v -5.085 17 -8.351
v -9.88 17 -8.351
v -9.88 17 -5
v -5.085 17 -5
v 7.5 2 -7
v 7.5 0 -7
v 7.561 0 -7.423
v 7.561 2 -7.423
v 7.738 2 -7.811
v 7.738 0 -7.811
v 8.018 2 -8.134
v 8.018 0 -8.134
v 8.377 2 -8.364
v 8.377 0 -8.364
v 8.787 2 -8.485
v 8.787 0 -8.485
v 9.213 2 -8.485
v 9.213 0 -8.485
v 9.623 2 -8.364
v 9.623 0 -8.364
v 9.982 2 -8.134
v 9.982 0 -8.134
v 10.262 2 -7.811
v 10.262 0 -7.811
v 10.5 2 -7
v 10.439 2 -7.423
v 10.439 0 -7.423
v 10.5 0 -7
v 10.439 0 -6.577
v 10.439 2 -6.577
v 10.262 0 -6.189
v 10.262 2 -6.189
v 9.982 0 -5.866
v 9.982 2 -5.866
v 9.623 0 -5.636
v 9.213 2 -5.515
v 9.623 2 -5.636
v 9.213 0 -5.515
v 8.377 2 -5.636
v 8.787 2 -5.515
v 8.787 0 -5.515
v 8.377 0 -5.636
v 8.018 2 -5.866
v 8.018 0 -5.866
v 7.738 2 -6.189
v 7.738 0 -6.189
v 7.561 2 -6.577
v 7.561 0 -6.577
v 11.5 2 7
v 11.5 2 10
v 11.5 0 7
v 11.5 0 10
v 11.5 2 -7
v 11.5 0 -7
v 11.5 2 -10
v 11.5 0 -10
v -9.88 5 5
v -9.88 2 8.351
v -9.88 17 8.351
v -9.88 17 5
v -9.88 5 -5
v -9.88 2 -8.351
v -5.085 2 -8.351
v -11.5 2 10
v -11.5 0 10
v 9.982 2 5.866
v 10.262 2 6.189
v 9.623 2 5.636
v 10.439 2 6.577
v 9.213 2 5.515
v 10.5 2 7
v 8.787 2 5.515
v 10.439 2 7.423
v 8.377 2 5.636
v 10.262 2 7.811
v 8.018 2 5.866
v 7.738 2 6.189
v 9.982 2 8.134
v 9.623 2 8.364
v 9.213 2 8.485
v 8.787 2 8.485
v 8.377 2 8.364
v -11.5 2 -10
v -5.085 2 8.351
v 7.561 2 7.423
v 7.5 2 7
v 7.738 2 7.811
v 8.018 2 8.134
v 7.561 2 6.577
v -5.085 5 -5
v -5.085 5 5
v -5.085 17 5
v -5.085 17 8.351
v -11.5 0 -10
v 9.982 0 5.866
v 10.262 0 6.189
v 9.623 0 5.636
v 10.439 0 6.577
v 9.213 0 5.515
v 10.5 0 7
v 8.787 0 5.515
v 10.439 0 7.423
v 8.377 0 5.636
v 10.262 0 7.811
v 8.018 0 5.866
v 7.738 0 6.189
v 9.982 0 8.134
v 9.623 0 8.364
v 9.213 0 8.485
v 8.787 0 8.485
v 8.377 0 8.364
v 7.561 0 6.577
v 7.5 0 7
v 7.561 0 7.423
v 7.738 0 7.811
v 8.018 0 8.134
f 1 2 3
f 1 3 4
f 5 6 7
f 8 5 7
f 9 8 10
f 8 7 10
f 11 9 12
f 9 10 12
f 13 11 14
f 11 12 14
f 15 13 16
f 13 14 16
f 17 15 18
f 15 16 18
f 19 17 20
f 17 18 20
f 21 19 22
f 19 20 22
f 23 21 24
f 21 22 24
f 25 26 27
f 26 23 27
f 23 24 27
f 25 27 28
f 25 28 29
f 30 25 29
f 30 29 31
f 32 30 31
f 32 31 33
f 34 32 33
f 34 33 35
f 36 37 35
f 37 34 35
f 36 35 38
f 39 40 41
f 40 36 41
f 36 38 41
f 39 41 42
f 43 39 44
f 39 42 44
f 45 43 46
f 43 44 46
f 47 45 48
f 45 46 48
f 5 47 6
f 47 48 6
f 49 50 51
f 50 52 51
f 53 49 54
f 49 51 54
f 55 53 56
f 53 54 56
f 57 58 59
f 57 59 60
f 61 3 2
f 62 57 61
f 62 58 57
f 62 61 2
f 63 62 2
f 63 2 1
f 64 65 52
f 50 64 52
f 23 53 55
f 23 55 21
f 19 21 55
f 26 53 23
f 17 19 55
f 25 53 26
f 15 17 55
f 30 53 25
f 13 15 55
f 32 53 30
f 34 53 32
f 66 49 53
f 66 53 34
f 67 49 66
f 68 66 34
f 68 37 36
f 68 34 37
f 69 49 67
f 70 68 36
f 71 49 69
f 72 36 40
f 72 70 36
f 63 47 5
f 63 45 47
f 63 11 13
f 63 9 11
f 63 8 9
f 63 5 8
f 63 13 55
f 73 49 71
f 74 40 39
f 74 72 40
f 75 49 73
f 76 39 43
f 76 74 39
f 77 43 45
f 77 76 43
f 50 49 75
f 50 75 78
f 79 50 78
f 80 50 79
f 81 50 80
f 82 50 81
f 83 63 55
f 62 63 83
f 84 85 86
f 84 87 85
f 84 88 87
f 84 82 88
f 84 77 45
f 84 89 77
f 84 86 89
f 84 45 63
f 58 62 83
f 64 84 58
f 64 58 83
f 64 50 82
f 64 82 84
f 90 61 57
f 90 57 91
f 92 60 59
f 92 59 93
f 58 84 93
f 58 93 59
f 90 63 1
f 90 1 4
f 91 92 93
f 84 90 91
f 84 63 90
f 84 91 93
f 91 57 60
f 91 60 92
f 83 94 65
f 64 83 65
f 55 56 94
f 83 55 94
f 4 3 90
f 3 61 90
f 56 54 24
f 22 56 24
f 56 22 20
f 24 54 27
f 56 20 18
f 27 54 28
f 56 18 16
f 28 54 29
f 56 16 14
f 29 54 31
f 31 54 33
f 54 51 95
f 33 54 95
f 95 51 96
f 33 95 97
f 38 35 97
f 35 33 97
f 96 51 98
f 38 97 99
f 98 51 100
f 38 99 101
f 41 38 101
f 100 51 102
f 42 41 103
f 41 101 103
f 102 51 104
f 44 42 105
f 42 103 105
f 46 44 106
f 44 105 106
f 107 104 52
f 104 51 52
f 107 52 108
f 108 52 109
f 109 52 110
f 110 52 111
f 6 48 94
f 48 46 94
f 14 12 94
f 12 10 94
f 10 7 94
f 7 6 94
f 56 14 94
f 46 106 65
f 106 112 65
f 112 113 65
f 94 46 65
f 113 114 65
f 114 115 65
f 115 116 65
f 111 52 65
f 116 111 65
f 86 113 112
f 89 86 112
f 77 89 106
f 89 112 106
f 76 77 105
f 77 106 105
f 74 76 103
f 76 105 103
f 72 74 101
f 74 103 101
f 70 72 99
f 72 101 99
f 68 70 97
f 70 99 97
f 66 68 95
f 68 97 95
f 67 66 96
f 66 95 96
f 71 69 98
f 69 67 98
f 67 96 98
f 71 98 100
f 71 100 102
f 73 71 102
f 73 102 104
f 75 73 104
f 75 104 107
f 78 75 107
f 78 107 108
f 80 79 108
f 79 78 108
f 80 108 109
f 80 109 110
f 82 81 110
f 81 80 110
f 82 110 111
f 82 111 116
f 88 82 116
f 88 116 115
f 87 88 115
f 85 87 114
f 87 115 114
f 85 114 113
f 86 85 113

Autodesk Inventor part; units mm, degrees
ref_plane "YZ Plane" through (0, 0, 0) normal (1, 0, 0) x (0, 1, 0)
ref_plane "XZ Plane" through (0, 0, 0) normal (0, 1, 0) x (-1, 0, 0)
ref_plane "XY Plane" through (0, 0, 0) normal (0, 0, 1) x (1, 0, 0)
sketch "Sketch1" plane through (0, 0, 0) normal (0, 1, 0) x (-1, 0, 0)
  line L0 (11.5, 10) -> (-11.5, 10)
  line L1 (-11.5, 10) -> (-11.5, -10)
  line L2 (-11.5, -10) -> (11.5, -10)
  line L3 (11.5, -10) -> (11.5, 10)
  line L4 (11.5, 10) -> (-11.5, -10) construction
  line L5 (-11.5, 10) -> (11.5, -10) construction
  line L6 (-11.5, 0) -> (-11.5, -7)
  line L7 (-11.5, 0) -> (-11.5, 7)
  line L8 (-11.5, 7) -> (-9, 7)
  circle A0 centre (-9, 7) radius 1.5
  line L9 (-11.5, -7) -> (-9, -7)
  circle A1 centre (-9, -7) radius 1.5
  point P0 (0, 0)
  dimension "d0" = 23
  dimension "d1" = 20
  dimension "d2" = 7
  dimension "d3" = 7
  dimension "d4" = 2.5
  dimension "d5" = 3
  dimension "d6" = 3
extrude "Extrusion1" add sketch "Sketch1" along normal blind 2
sketch "Sketch2" plane through (0, 2, 0) normal (0, 1, 0) x (1, 0, 0)
  line L0 (-5.0848, -8.3507) -> (-9.8803, -8.3507)
  line L1 (-9.8803, -8.3507) -> (-9.8803, 8.3507)
  line L2 (-9.8803, 8.3507) -> (-5.0848, 8.3507)
  line L3 (-5.0848, 8.3507) -> (-5.0848, -8.3507)
  line L4 (-5.0848, -8.3507) -> (-9.8803, 8.3507) construction
  line L5 (-9.8803, -8.3507) -> (-5.0848, 8.3507) construction
  line L6 (-9.8803, 0) -> (-9.8803, 5)
  line L7 (-9.8803, 0) -> (-9.8803, -5)
  line L8 (-9.8803, -5) -> (-5.0848, -5)
  line L9 (-5.0848, -5) -> (-5.0848, -8.3507)
  line L10 (-5.0848, -8.3507) -> (-9.8803, -8.3507)
  line L11 (-9.8803, -8.3507) -> (-9.8803, -5)
  line L12 (-9.8803, 5) -> (-5.0848, 5)
  line L13 (-5.0848, 5) -> (-5.0848, 8.3507)
  line L14 (-5.0848, 8.3507) -> (-9.8803, 8.3507)
  line L15 (-9.8803, 8.3507) -> (-9.8803, 5)
  point P0 (0, 0)
  point P1 (-7.4826, 0)
  dimension "d9" = 5
  dimension "d10" = 5
extrude "Extrusion2" add sketch "Sketch2" along normal blind 15 contours L0 L1 L8 L3 | L12 L1 L2 L3
sketch "Sketch3" plane through (0, 2, 0) normal (0, 1, 0) x (1, 0, 0)
  line L0 (-5.0848, -8.3507) -> (-5.0848, -5) projected
  line L1 (-9.8803, 5) -> (-5.0848, 5) projected
  line L2 (-5.0848, -5) -> (-9.8803, -5)
  line L3 (-9.8803, -5) -> (-9.8803, 5)
  line L4 (-9.8803, 5) -> (-5.0848, 5)
  line L5 (-5.0848, 5) -> (-5.0848, -5)
  point P0 (0, 0)
extrude "Extrusion3" add sketch "Sketch3" along normal blind 3
ref_plane "Work Plane1" through (-5.0848, 17, 0) normal (0, 0, -1) x (-1, 0, 0)
ref_plane "Work Plane2" through (-7.4826, 2, -8.3507) normal (-1, 0, 0) x (0, 0, 1)
properties part number "lichtschrankenmodulmodell"
